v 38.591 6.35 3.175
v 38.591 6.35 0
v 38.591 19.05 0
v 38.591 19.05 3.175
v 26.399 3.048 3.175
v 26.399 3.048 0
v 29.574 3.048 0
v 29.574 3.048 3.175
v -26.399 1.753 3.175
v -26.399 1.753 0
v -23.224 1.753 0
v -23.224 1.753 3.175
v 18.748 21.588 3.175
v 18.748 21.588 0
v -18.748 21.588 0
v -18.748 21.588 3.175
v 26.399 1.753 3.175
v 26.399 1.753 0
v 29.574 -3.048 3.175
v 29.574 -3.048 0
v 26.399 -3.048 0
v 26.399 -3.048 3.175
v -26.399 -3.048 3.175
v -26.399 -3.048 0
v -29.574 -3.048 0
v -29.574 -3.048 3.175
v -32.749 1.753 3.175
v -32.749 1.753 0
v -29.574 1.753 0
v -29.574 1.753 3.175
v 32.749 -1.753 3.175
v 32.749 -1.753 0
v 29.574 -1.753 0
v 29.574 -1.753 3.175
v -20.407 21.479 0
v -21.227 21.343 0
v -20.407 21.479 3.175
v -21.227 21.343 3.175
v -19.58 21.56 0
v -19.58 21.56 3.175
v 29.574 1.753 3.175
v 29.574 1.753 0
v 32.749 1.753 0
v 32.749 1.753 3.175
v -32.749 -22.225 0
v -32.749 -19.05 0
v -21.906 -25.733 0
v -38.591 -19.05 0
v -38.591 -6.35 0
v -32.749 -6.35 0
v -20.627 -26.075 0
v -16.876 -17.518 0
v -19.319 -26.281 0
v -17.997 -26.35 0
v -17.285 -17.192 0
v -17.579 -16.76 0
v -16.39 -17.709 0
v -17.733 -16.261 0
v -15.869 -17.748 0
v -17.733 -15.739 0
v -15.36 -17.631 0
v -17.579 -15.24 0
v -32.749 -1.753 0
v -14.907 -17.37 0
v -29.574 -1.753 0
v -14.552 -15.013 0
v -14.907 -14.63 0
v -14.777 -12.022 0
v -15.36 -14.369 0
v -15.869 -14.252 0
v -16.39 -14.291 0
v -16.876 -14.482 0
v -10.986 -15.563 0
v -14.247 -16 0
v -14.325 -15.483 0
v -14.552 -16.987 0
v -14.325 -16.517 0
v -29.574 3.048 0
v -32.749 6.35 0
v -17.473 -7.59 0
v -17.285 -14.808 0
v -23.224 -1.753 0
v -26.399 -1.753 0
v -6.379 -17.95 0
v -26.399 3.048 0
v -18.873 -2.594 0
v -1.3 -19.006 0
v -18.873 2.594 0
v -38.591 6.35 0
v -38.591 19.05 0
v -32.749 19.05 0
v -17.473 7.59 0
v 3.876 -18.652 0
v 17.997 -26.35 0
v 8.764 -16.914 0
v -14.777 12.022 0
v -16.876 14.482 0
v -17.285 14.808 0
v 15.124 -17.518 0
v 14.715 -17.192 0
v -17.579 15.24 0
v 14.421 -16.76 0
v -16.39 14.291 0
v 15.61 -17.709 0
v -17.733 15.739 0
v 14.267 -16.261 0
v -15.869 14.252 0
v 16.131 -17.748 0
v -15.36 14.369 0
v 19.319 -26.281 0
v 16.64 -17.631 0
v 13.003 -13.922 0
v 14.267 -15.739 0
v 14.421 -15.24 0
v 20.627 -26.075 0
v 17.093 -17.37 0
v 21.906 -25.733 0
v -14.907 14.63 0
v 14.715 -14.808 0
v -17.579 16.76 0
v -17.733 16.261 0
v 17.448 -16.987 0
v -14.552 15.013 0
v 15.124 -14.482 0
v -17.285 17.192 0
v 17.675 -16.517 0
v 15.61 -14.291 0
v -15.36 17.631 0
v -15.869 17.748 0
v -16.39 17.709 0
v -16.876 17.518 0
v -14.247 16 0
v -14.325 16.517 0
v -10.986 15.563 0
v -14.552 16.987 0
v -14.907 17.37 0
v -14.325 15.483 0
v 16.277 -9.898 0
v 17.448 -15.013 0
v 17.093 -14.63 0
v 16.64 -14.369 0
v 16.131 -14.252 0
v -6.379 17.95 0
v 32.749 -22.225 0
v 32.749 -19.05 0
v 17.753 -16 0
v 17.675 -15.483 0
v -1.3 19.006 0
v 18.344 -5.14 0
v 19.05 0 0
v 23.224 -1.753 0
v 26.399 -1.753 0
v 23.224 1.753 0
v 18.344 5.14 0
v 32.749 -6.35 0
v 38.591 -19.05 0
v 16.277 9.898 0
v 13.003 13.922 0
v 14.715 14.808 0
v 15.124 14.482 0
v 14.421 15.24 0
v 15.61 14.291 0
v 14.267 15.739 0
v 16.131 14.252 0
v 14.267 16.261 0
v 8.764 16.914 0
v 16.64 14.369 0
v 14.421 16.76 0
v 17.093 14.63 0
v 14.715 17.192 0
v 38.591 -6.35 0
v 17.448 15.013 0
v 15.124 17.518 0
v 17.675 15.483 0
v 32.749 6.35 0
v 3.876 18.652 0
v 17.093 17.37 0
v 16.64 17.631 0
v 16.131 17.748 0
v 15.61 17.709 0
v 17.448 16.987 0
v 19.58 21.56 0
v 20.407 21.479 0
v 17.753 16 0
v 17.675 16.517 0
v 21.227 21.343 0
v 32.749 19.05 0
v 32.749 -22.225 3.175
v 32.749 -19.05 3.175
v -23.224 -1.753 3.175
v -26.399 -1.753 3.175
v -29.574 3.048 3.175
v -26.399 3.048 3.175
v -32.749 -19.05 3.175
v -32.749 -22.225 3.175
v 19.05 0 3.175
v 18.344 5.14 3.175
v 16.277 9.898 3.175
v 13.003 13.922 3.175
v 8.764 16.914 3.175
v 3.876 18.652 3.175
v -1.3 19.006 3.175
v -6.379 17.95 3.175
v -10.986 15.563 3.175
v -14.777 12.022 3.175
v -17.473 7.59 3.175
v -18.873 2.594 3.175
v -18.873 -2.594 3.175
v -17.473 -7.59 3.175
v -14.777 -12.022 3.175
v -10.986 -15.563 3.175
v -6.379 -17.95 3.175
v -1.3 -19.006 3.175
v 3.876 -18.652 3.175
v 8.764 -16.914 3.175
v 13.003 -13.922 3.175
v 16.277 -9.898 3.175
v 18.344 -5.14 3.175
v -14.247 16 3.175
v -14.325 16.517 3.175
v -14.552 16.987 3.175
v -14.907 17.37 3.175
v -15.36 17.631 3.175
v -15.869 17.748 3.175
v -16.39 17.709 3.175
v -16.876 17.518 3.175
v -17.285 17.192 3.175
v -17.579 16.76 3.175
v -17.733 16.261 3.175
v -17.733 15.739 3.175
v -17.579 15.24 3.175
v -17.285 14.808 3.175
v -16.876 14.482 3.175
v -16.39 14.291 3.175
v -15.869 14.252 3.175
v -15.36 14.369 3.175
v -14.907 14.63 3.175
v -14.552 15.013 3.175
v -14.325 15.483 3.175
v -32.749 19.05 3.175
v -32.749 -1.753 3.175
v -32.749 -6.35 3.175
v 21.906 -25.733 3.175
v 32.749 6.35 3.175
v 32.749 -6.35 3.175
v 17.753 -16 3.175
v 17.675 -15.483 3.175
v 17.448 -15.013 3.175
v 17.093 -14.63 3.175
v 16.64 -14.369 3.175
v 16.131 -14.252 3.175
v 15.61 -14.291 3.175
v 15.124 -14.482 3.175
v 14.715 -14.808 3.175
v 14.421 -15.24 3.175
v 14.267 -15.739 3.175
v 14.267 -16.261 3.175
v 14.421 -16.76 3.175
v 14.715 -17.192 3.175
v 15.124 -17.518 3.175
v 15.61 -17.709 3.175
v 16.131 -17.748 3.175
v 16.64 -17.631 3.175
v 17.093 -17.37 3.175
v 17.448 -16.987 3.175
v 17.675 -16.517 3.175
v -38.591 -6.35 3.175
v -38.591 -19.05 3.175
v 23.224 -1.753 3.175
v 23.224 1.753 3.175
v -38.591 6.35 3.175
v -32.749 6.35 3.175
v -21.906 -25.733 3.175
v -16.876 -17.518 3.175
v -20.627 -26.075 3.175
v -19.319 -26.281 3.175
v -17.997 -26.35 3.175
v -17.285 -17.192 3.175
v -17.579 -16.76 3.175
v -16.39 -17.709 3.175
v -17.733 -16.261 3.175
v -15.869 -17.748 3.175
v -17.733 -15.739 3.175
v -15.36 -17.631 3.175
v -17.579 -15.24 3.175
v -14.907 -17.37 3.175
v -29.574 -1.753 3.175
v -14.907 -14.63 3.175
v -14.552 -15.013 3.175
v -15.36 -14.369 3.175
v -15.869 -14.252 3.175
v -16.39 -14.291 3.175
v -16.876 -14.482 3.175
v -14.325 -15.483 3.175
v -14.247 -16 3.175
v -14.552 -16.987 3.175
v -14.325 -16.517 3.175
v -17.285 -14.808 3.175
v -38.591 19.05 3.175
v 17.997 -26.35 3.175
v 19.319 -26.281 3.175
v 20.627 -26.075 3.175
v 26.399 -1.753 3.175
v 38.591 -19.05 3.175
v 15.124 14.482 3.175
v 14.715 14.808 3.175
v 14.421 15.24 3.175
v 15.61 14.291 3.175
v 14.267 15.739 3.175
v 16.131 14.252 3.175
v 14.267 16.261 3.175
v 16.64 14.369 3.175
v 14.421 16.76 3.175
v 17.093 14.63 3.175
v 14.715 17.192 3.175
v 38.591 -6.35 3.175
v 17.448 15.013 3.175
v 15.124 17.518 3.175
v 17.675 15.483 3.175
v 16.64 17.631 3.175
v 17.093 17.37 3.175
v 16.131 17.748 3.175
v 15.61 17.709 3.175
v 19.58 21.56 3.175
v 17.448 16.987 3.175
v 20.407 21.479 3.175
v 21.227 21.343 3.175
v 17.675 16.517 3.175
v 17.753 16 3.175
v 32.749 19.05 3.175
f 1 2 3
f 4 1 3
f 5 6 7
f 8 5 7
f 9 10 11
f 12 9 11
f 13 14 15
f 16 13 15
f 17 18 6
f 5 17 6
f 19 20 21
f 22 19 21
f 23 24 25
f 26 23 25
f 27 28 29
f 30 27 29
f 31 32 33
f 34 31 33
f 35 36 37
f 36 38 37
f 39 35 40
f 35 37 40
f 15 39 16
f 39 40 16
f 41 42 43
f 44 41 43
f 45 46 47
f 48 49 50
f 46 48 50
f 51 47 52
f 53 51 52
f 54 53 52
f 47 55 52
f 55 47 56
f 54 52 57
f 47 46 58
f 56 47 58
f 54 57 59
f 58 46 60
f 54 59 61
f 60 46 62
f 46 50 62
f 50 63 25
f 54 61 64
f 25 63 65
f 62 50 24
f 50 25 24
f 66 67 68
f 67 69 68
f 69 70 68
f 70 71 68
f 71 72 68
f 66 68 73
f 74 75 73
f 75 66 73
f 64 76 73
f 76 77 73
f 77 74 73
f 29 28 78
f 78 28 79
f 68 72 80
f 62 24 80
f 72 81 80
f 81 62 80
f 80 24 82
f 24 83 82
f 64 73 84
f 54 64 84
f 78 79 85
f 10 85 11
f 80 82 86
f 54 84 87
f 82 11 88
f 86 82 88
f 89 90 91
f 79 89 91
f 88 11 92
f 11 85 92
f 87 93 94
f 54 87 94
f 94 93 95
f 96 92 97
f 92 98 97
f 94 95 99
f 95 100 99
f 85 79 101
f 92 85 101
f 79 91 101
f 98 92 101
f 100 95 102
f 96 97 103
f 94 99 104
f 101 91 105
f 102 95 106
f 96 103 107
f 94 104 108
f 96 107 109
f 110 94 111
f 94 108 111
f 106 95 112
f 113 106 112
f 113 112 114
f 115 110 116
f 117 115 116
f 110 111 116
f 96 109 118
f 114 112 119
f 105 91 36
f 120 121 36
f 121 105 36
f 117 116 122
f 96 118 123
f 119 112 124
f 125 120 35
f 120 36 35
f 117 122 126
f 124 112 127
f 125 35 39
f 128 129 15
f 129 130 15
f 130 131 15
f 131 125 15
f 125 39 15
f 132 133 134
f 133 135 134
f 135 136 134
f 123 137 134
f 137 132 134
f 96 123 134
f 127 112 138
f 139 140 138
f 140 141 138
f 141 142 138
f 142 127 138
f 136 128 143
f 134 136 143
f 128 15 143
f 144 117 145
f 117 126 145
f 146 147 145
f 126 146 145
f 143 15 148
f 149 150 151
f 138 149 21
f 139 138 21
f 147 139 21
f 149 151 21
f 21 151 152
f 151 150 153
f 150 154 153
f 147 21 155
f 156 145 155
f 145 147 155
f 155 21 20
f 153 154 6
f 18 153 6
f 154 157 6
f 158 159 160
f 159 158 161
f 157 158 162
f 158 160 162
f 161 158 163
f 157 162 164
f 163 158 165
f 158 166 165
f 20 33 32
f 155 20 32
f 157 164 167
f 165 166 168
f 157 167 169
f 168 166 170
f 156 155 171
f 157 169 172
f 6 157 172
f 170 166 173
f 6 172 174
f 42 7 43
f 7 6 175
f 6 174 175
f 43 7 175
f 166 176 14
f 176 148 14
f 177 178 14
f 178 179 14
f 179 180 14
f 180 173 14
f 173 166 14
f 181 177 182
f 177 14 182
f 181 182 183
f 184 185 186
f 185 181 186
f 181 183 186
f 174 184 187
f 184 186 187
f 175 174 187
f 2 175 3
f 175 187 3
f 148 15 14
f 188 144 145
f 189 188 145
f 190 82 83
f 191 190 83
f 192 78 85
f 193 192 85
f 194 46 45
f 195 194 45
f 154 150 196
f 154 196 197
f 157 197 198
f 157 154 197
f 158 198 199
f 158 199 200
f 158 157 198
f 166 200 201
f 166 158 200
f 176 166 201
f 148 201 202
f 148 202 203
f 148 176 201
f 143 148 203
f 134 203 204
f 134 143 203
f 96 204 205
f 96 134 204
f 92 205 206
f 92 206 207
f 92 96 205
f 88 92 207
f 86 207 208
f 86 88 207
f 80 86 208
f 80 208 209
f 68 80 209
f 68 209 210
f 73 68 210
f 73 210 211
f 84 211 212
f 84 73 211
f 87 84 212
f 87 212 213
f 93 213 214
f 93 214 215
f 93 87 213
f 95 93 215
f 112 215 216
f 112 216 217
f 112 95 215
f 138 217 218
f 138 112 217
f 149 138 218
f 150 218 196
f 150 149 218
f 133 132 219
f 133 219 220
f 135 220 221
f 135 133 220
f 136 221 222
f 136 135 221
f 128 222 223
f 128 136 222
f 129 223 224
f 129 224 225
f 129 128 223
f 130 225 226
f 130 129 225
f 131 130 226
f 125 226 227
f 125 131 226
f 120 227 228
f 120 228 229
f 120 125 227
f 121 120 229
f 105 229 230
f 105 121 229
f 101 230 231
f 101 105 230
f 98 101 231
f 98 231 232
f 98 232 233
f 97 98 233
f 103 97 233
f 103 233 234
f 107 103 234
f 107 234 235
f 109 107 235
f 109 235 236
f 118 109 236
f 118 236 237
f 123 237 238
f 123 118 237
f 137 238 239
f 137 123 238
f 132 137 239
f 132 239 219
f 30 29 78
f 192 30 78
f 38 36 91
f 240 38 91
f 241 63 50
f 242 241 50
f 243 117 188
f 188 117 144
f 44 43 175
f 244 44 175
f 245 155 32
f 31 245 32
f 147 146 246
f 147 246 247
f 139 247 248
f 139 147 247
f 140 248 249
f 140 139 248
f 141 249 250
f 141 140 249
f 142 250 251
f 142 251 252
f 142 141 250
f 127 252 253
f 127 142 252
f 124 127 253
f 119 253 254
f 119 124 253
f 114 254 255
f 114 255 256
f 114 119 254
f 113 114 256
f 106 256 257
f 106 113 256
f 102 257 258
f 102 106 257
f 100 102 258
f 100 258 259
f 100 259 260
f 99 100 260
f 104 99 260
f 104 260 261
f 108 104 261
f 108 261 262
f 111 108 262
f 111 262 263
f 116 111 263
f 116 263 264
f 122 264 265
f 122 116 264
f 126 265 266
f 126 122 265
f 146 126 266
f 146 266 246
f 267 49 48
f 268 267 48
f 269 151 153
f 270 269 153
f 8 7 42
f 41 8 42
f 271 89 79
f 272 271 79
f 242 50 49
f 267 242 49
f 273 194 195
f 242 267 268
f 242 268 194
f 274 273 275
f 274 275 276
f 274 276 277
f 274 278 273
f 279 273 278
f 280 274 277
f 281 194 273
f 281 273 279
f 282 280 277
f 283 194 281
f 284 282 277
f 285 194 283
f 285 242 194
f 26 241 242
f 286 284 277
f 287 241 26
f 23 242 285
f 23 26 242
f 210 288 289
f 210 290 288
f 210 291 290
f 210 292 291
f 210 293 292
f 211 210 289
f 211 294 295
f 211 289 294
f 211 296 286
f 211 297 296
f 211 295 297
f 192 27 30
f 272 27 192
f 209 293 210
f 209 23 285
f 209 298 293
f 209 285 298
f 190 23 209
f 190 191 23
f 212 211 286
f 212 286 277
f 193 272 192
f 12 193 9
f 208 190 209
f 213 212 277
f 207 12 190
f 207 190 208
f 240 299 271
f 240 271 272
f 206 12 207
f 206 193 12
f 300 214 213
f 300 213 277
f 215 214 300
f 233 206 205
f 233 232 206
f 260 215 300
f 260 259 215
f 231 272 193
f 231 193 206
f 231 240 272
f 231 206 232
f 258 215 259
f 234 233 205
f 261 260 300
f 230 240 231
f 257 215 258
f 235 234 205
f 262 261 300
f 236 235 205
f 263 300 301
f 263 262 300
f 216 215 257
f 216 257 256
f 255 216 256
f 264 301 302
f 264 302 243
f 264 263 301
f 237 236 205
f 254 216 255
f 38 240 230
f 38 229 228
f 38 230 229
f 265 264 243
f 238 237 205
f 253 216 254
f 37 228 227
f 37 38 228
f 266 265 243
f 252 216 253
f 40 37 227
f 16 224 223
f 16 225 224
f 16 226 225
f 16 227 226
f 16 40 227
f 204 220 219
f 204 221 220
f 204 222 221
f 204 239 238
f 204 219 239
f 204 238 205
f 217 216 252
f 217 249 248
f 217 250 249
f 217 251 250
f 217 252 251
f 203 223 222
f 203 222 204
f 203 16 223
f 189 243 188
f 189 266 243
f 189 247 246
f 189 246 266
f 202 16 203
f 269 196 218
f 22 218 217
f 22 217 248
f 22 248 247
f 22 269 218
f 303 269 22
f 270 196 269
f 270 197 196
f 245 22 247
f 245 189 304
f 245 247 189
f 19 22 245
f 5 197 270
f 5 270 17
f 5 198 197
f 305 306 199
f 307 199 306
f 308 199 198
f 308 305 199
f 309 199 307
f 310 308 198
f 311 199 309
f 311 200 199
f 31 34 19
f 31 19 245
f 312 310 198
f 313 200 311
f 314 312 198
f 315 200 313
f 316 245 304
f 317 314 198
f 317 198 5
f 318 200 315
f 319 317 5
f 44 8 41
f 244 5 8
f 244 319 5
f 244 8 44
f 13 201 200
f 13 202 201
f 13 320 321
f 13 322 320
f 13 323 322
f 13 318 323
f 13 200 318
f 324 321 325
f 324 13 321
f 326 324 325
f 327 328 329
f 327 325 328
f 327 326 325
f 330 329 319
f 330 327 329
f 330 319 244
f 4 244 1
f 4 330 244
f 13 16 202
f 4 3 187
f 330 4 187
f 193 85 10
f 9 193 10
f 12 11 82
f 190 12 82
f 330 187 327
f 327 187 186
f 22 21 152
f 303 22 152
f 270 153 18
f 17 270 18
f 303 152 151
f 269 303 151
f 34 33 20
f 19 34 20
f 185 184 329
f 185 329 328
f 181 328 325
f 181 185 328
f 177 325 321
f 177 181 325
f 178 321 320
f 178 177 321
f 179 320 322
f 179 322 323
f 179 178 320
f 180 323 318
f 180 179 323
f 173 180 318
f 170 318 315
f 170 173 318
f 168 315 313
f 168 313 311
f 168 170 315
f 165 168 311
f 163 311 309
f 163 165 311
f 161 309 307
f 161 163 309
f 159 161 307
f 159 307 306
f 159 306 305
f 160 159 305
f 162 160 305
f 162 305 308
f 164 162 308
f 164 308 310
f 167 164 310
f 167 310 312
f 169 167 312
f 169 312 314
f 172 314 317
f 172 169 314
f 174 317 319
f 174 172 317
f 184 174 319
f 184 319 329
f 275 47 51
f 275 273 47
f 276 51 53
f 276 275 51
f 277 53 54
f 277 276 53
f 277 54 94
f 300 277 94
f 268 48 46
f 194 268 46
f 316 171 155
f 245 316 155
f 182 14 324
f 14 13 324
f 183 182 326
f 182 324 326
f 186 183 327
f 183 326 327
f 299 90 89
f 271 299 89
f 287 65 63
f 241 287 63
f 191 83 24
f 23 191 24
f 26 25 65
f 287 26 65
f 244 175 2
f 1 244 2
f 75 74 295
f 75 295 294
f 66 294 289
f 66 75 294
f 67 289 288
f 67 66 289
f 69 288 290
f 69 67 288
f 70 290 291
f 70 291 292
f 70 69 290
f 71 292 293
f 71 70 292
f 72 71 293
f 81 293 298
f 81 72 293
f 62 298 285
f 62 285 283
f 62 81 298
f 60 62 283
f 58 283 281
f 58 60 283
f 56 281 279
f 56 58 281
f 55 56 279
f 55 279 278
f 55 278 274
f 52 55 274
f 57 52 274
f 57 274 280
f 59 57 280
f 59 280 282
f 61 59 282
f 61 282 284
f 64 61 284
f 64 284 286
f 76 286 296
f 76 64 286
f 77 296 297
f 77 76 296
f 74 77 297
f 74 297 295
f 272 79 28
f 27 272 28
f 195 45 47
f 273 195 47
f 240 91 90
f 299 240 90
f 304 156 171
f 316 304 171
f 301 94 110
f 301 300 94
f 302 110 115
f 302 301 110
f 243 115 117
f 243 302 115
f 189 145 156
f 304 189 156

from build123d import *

# Parameters (mm, degrees)
F0_R     = 1.7526
F0_R_2   = 19.05
F1_DEPTH = 3.175
F2_R     = 12.7


with BuildPart() as f1:
    # F0 (on Top) → F1 (new body)
    with BuildSketch(Plane.XY):
        Polygon((-32.74949, -1.7526), (-32.74949, -6.35), (-38.59149, -6.35), (-38.59149, -19.05), (-32.74949, -19.05), (-32.74949, -22.225), (-20, -26.35), (0, -26.35), (20, -26.35), (32.74949, -22.225), (32.74949, -19.05), (38.59149, -19.05), (38.59149, -6.35), (32.74949, -6.35), (32.74949, -1.7526), (29.57449, -1.7526), (29.57449, -3.048), (26.39949, -3.048), (26.39949, -1.7526), (23.22449, -1.7526), (23.22449, 1.7526), (26.39949, 1.7526), (26.39949, 3.048), (29.57449, 3.048), (29.57449, 1.7526), (32.74949, 1.7526), (32.74949, 6.35), (38.59149, 6.35), (38.59149, 19.05), (32.74949, 19.05), (20, 21.5875), (0, 21.5875), (-20, 21.5875), (-32.74949, 19.05), (-38.59149, 19.05), (-38.59149, 6.35), (-32.74949, 6.35), (-32.74949, 1.7526), (-29.57449, 1.7526), (-29.57449, 3.048), (-26.39949, 3.048), (-26.39949, 1.7526), (-23.22449, 1.7526), (-23.22449, -1.7526), (-26.39949, -1.7526), (-26.39949, -3.048), (-29.57449, -3.048), (-29.57449, -1.7526), align=None)
        with Locations((-16, -16)):
            Circle(F0_R, mode=Mode.SUBTRACT)
        with Locations((16, -16)):
            Circle(F0_R, mode=Mode.SUBTRACT)
        with Locations((-16, 16)):
            Circle(F0_R, mode=Mode.SUBTRACT)
        Circle(F0_R_2, mode=Mode.SUBTRACT)
        with Locations((16, 16)):
            Circle(F0_R, mode=Mode.SUBTRACT)
    extrude(amount=F1_DEPTH)

    # F2
    f2_edges = [f1.edges().sort_by_distance(p)[0] for p in [
        (-20, -26.35, 1.5875),
        (20, -26.35, 1.5875),
        (20, 21.5875, 1.5875),
        (-20, 21.5875, 1.5875),
    ]]
    fillet(f2_edges, radius=F2_R)


solid = f1.part
